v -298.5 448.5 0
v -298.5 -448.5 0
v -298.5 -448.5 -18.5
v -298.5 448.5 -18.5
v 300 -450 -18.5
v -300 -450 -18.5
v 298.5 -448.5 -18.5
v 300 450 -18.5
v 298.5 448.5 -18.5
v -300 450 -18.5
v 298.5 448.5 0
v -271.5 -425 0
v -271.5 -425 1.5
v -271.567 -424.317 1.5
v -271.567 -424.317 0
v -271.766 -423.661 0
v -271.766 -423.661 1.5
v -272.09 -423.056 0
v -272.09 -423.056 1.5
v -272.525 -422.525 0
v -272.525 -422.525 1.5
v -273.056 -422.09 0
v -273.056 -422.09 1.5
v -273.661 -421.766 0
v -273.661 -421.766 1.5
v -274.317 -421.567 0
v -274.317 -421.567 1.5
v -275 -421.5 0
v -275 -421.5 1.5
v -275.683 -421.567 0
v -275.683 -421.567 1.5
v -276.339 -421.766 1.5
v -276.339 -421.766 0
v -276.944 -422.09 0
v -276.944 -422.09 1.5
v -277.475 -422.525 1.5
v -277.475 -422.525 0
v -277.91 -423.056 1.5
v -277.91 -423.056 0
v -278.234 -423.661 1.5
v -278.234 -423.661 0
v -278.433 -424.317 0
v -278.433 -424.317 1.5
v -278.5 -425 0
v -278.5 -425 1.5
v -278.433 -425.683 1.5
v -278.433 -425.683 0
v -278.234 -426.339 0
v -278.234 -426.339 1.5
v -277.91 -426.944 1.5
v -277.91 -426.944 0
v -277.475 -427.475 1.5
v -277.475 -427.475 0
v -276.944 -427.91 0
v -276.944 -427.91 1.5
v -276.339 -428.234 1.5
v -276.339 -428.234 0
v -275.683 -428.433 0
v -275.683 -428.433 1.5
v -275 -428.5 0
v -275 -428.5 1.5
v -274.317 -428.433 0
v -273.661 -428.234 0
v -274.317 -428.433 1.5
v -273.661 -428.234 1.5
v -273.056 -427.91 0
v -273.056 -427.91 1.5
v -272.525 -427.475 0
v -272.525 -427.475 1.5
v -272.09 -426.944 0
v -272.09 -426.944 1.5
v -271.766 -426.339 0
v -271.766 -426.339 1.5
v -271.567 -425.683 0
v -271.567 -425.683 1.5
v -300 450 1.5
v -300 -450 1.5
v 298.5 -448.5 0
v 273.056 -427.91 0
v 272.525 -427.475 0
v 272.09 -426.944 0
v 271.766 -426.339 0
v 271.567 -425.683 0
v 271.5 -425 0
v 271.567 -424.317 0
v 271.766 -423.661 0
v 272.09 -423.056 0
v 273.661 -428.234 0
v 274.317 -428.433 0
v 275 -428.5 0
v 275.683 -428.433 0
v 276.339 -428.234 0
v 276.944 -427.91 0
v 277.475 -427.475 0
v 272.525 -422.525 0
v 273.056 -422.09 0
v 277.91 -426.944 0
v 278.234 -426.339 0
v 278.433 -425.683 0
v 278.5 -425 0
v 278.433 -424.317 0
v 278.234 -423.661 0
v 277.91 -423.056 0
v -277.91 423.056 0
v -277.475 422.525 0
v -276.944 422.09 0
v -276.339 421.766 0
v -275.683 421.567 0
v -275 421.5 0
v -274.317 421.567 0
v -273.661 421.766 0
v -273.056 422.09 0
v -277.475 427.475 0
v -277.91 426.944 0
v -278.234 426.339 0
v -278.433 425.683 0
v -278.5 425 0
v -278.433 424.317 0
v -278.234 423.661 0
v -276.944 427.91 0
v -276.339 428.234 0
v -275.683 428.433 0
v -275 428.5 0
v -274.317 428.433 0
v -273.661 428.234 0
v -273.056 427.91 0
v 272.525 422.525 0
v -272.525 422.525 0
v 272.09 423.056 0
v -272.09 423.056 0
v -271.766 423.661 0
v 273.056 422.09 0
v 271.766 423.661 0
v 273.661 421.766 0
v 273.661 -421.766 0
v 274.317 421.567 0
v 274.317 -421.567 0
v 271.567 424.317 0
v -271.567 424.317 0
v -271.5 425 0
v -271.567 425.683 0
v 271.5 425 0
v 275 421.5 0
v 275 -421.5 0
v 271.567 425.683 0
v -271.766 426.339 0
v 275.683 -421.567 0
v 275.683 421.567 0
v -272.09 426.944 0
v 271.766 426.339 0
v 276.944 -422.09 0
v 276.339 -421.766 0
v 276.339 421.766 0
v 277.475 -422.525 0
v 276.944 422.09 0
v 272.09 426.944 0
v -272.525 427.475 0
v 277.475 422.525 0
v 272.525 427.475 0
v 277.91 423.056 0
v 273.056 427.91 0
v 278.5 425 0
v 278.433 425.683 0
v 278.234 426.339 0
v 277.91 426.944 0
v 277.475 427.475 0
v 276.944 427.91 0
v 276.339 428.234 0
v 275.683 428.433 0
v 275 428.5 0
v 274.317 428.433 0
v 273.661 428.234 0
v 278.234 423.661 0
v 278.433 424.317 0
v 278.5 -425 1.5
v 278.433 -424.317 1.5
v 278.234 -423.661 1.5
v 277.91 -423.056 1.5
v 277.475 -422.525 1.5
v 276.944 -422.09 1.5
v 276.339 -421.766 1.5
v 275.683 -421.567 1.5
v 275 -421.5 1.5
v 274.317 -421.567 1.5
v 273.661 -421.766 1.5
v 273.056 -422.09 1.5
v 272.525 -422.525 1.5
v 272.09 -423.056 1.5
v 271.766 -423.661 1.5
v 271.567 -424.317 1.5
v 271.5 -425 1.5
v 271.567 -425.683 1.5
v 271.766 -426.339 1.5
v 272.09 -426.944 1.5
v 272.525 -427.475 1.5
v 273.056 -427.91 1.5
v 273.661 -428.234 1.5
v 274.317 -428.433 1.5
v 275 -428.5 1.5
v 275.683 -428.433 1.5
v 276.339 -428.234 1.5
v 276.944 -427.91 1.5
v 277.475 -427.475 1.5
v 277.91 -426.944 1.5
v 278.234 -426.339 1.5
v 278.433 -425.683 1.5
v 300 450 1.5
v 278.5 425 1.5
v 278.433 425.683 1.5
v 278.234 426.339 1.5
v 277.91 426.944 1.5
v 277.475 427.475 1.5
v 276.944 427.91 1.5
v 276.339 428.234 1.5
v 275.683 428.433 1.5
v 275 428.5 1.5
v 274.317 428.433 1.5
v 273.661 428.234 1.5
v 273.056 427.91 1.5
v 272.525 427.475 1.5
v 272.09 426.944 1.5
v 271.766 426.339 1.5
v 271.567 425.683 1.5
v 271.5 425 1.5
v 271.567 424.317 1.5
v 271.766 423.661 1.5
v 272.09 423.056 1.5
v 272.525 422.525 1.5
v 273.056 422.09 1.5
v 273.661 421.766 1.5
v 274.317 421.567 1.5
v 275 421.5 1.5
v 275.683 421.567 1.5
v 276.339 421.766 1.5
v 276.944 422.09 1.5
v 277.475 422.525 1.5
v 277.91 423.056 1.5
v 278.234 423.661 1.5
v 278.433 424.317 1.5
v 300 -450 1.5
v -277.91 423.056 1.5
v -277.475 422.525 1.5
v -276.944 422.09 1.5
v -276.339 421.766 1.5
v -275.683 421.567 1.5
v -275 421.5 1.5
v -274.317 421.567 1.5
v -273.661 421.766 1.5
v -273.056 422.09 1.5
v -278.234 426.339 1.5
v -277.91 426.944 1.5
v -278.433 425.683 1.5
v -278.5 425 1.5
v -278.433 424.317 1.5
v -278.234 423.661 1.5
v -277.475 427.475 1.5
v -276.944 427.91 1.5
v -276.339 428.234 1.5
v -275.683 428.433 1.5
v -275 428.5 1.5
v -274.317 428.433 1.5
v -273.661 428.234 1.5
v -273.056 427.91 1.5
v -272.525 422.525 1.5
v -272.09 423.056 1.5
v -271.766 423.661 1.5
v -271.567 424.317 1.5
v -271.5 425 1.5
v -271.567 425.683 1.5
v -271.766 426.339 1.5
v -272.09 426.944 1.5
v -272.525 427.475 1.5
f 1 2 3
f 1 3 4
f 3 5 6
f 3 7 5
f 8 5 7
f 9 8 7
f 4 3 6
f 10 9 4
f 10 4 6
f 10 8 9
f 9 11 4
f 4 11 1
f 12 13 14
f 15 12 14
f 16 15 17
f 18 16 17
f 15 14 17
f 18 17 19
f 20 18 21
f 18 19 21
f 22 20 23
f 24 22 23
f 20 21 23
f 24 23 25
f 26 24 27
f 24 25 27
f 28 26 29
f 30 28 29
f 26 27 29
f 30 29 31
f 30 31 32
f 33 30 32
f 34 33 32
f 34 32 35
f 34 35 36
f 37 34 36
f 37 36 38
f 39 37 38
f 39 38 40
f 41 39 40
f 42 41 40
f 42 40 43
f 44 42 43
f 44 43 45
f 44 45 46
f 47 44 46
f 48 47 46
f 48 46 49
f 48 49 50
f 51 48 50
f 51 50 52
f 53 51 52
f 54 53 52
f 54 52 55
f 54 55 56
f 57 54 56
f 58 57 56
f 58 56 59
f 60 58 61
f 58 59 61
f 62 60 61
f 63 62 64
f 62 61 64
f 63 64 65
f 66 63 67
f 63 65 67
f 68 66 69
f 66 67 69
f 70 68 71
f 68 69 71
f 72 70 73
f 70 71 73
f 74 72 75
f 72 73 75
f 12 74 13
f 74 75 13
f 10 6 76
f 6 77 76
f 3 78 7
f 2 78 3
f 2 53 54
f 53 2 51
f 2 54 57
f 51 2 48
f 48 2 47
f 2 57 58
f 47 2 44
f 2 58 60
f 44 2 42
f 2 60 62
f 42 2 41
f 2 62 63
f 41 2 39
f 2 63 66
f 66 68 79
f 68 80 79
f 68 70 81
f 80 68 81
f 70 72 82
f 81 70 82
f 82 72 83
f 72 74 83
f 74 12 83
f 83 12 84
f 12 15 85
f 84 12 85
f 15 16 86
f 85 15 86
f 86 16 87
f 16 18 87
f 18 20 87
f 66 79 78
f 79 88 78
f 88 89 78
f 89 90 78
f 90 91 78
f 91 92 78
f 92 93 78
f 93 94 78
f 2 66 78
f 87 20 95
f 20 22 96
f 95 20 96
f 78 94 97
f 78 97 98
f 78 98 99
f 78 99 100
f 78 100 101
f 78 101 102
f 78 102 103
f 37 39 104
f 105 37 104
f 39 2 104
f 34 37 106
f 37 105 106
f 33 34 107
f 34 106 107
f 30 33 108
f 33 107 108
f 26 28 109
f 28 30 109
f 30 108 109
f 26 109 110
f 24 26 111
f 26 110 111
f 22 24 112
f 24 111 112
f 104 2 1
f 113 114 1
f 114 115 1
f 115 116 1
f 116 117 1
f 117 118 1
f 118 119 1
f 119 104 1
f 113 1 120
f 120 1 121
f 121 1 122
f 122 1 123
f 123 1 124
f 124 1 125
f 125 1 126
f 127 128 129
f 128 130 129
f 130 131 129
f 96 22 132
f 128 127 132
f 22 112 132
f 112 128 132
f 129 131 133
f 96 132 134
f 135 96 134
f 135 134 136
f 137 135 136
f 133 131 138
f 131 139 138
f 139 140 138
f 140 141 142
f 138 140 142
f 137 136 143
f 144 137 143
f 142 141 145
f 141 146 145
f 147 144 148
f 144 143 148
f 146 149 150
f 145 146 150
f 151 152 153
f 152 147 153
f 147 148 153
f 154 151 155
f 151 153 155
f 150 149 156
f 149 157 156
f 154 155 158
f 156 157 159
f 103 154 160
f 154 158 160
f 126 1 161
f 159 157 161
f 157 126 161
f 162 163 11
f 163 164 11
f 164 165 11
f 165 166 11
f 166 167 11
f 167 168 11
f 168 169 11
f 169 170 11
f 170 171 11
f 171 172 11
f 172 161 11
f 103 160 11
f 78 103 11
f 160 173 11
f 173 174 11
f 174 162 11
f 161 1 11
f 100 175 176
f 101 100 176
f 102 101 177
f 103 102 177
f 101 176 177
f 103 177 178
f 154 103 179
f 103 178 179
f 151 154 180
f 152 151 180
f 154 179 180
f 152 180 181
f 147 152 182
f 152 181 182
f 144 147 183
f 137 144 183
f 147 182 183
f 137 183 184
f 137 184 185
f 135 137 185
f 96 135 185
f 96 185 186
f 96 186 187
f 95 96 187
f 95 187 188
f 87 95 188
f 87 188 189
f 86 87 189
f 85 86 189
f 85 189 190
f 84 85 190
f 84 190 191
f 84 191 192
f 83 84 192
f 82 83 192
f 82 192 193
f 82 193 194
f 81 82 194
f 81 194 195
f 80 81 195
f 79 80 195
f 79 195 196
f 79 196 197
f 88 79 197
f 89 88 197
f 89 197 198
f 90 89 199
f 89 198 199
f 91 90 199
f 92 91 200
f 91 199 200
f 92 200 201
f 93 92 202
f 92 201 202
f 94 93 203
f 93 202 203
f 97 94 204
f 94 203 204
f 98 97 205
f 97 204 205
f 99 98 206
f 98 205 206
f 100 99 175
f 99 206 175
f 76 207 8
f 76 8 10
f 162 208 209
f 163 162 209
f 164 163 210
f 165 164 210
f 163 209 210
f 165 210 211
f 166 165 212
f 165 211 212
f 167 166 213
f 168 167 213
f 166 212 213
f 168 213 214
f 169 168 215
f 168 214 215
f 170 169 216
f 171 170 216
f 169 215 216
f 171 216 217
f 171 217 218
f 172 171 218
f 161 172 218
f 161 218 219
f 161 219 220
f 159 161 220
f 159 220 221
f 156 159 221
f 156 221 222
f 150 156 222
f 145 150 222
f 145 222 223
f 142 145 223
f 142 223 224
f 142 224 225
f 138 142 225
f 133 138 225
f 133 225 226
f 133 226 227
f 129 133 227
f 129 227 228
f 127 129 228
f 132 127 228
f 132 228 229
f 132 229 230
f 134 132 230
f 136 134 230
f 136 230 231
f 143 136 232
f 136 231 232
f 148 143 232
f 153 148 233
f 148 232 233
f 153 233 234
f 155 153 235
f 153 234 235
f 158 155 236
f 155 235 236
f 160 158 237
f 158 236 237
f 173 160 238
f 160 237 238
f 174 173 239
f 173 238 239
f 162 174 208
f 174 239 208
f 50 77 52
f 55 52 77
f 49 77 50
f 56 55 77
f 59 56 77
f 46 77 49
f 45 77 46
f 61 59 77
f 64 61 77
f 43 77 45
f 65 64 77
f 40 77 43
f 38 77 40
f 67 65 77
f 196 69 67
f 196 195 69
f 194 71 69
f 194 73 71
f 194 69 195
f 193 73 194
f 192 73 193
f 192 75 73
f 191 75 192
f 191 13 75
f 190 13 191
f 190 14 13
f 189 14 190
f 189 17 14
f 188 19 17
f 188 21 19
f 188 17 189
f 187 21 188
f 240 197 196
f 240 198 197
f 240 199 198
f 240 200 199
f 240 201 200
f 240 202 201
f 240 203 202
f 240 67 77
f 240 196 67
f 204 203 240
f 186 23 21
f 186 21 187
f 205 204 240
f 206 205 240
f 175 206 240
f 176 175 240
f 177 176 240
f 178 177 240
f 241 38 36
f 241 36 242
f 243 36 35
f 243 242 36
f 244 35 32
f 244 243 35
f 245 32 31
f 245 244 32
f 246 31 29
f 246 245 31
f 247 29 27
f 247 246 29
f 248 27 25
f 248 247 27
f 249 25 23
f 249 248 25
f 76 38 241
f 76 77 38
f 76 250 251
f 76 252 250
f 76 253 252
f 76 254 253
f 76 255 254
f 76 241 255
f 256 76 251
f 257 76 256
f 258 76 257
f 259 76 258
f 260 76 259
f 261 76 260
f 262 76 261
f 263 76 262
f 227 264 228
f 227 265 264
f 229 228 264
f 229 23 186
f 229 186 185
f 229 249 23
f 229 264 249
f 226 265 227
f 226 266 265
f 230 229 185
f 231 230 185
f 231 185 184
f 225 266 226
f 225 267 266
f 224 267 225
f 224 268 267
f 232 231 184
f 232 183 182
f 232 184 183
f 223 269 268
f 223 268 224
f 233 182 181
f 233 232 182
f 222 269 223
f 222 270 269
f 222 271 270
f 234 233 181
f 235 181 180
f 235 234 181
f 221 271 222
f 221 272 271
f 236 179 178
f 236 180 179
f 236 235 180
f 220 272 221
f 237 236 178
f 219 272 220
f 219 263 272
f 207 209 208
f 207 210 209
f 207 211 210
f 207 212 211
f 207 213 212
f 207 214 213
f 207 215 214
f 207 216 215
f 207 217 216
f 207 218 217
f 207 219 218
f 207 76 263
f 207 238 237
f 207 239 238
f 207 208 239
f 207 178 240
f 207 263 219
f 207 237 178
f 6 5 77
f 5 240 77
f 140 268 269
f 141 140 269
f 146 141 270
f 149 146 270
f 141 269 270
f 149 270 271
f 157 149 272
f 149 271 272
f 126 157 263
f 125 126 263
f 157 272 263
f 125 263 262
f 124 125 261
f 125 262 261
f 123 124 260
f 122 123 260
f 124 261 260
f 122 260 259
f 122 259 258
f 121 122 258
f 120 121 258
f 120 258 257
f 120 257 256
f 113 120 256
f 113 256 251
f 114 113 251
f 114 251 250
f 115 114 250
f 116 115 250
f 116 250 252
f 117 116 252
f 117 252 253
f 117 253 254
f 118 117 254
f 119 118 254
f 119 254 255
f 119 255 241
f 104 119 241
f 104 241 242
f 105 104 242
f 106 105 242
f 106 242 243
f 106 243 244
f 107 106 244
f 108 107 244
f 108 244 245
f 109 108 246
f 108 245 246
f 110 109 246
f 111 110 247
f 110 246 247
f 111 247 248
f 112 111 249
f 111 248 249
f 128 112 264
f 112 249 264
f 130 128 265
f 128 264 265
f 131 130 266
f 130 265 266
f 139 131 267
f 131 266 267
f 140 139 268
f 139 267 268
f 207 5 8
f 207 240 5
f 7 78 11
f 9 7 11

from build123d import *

# Parameters (mm, degrees)
SKETCH_1_W          = 600
SKETCH_1_H          = 900
EXTRUDE_1_DEPTH     = 1.5
SKETCH_2_W          = 600
SKETCH_2_H          = 900
SKETCH_2_W_2        = 597
SKETCH_2_H_2        = 897
EXTRUDE_2_DEPTH     = 18.5
SKETCH_4_R          = 3.5
CUT_EXTRUDE_1_DEPTH = 10


with BuildPart() as part:
    # 草图1 → 凸台-拉伸1 (new body)
    with BuildSketch(Plane.XY):
        Rectangle(SKETCH_1_W, SKETCH_1_H)
    extrude(amount=EXTRUDE_1_DEPTH)

    # 草图2 → 凸台-拉伸2 (add)
    with BuildSketch(Plane(origin=(0, 0, 0), x_dir=(-1, 0, 0), z_dir=(0, 0, -1))):
        Rectangle(SKETCH_2_W, SKETCH_2_H)
        Rectangle(SKETCH_2_W_2, SKETCH_2_H_2, mode=Mode.SUBTRACT)
    extrude(amount=EXTRUDE_2_DEPTH)

    # 草图4 → 切除-拉伸1 (cut)
    with BuildSketch(Plane.XY.offset(1.5)):
        with Locations((-275, 425)):
            Circle(SKETCH_4_R)
        with Locations((275, 425)):
            Circle(SKETCH_4_R)
        with Locations((-275, -425)):
            Circle(SKETCH_4_R)
        with Locations((275, -425)):
            Circle(SKETCH_4_R)
    extrude(amount=-CUT_EXTRUDE_1_DEPTH, mode=Mode.SUBTRACT)


solid = part.part
